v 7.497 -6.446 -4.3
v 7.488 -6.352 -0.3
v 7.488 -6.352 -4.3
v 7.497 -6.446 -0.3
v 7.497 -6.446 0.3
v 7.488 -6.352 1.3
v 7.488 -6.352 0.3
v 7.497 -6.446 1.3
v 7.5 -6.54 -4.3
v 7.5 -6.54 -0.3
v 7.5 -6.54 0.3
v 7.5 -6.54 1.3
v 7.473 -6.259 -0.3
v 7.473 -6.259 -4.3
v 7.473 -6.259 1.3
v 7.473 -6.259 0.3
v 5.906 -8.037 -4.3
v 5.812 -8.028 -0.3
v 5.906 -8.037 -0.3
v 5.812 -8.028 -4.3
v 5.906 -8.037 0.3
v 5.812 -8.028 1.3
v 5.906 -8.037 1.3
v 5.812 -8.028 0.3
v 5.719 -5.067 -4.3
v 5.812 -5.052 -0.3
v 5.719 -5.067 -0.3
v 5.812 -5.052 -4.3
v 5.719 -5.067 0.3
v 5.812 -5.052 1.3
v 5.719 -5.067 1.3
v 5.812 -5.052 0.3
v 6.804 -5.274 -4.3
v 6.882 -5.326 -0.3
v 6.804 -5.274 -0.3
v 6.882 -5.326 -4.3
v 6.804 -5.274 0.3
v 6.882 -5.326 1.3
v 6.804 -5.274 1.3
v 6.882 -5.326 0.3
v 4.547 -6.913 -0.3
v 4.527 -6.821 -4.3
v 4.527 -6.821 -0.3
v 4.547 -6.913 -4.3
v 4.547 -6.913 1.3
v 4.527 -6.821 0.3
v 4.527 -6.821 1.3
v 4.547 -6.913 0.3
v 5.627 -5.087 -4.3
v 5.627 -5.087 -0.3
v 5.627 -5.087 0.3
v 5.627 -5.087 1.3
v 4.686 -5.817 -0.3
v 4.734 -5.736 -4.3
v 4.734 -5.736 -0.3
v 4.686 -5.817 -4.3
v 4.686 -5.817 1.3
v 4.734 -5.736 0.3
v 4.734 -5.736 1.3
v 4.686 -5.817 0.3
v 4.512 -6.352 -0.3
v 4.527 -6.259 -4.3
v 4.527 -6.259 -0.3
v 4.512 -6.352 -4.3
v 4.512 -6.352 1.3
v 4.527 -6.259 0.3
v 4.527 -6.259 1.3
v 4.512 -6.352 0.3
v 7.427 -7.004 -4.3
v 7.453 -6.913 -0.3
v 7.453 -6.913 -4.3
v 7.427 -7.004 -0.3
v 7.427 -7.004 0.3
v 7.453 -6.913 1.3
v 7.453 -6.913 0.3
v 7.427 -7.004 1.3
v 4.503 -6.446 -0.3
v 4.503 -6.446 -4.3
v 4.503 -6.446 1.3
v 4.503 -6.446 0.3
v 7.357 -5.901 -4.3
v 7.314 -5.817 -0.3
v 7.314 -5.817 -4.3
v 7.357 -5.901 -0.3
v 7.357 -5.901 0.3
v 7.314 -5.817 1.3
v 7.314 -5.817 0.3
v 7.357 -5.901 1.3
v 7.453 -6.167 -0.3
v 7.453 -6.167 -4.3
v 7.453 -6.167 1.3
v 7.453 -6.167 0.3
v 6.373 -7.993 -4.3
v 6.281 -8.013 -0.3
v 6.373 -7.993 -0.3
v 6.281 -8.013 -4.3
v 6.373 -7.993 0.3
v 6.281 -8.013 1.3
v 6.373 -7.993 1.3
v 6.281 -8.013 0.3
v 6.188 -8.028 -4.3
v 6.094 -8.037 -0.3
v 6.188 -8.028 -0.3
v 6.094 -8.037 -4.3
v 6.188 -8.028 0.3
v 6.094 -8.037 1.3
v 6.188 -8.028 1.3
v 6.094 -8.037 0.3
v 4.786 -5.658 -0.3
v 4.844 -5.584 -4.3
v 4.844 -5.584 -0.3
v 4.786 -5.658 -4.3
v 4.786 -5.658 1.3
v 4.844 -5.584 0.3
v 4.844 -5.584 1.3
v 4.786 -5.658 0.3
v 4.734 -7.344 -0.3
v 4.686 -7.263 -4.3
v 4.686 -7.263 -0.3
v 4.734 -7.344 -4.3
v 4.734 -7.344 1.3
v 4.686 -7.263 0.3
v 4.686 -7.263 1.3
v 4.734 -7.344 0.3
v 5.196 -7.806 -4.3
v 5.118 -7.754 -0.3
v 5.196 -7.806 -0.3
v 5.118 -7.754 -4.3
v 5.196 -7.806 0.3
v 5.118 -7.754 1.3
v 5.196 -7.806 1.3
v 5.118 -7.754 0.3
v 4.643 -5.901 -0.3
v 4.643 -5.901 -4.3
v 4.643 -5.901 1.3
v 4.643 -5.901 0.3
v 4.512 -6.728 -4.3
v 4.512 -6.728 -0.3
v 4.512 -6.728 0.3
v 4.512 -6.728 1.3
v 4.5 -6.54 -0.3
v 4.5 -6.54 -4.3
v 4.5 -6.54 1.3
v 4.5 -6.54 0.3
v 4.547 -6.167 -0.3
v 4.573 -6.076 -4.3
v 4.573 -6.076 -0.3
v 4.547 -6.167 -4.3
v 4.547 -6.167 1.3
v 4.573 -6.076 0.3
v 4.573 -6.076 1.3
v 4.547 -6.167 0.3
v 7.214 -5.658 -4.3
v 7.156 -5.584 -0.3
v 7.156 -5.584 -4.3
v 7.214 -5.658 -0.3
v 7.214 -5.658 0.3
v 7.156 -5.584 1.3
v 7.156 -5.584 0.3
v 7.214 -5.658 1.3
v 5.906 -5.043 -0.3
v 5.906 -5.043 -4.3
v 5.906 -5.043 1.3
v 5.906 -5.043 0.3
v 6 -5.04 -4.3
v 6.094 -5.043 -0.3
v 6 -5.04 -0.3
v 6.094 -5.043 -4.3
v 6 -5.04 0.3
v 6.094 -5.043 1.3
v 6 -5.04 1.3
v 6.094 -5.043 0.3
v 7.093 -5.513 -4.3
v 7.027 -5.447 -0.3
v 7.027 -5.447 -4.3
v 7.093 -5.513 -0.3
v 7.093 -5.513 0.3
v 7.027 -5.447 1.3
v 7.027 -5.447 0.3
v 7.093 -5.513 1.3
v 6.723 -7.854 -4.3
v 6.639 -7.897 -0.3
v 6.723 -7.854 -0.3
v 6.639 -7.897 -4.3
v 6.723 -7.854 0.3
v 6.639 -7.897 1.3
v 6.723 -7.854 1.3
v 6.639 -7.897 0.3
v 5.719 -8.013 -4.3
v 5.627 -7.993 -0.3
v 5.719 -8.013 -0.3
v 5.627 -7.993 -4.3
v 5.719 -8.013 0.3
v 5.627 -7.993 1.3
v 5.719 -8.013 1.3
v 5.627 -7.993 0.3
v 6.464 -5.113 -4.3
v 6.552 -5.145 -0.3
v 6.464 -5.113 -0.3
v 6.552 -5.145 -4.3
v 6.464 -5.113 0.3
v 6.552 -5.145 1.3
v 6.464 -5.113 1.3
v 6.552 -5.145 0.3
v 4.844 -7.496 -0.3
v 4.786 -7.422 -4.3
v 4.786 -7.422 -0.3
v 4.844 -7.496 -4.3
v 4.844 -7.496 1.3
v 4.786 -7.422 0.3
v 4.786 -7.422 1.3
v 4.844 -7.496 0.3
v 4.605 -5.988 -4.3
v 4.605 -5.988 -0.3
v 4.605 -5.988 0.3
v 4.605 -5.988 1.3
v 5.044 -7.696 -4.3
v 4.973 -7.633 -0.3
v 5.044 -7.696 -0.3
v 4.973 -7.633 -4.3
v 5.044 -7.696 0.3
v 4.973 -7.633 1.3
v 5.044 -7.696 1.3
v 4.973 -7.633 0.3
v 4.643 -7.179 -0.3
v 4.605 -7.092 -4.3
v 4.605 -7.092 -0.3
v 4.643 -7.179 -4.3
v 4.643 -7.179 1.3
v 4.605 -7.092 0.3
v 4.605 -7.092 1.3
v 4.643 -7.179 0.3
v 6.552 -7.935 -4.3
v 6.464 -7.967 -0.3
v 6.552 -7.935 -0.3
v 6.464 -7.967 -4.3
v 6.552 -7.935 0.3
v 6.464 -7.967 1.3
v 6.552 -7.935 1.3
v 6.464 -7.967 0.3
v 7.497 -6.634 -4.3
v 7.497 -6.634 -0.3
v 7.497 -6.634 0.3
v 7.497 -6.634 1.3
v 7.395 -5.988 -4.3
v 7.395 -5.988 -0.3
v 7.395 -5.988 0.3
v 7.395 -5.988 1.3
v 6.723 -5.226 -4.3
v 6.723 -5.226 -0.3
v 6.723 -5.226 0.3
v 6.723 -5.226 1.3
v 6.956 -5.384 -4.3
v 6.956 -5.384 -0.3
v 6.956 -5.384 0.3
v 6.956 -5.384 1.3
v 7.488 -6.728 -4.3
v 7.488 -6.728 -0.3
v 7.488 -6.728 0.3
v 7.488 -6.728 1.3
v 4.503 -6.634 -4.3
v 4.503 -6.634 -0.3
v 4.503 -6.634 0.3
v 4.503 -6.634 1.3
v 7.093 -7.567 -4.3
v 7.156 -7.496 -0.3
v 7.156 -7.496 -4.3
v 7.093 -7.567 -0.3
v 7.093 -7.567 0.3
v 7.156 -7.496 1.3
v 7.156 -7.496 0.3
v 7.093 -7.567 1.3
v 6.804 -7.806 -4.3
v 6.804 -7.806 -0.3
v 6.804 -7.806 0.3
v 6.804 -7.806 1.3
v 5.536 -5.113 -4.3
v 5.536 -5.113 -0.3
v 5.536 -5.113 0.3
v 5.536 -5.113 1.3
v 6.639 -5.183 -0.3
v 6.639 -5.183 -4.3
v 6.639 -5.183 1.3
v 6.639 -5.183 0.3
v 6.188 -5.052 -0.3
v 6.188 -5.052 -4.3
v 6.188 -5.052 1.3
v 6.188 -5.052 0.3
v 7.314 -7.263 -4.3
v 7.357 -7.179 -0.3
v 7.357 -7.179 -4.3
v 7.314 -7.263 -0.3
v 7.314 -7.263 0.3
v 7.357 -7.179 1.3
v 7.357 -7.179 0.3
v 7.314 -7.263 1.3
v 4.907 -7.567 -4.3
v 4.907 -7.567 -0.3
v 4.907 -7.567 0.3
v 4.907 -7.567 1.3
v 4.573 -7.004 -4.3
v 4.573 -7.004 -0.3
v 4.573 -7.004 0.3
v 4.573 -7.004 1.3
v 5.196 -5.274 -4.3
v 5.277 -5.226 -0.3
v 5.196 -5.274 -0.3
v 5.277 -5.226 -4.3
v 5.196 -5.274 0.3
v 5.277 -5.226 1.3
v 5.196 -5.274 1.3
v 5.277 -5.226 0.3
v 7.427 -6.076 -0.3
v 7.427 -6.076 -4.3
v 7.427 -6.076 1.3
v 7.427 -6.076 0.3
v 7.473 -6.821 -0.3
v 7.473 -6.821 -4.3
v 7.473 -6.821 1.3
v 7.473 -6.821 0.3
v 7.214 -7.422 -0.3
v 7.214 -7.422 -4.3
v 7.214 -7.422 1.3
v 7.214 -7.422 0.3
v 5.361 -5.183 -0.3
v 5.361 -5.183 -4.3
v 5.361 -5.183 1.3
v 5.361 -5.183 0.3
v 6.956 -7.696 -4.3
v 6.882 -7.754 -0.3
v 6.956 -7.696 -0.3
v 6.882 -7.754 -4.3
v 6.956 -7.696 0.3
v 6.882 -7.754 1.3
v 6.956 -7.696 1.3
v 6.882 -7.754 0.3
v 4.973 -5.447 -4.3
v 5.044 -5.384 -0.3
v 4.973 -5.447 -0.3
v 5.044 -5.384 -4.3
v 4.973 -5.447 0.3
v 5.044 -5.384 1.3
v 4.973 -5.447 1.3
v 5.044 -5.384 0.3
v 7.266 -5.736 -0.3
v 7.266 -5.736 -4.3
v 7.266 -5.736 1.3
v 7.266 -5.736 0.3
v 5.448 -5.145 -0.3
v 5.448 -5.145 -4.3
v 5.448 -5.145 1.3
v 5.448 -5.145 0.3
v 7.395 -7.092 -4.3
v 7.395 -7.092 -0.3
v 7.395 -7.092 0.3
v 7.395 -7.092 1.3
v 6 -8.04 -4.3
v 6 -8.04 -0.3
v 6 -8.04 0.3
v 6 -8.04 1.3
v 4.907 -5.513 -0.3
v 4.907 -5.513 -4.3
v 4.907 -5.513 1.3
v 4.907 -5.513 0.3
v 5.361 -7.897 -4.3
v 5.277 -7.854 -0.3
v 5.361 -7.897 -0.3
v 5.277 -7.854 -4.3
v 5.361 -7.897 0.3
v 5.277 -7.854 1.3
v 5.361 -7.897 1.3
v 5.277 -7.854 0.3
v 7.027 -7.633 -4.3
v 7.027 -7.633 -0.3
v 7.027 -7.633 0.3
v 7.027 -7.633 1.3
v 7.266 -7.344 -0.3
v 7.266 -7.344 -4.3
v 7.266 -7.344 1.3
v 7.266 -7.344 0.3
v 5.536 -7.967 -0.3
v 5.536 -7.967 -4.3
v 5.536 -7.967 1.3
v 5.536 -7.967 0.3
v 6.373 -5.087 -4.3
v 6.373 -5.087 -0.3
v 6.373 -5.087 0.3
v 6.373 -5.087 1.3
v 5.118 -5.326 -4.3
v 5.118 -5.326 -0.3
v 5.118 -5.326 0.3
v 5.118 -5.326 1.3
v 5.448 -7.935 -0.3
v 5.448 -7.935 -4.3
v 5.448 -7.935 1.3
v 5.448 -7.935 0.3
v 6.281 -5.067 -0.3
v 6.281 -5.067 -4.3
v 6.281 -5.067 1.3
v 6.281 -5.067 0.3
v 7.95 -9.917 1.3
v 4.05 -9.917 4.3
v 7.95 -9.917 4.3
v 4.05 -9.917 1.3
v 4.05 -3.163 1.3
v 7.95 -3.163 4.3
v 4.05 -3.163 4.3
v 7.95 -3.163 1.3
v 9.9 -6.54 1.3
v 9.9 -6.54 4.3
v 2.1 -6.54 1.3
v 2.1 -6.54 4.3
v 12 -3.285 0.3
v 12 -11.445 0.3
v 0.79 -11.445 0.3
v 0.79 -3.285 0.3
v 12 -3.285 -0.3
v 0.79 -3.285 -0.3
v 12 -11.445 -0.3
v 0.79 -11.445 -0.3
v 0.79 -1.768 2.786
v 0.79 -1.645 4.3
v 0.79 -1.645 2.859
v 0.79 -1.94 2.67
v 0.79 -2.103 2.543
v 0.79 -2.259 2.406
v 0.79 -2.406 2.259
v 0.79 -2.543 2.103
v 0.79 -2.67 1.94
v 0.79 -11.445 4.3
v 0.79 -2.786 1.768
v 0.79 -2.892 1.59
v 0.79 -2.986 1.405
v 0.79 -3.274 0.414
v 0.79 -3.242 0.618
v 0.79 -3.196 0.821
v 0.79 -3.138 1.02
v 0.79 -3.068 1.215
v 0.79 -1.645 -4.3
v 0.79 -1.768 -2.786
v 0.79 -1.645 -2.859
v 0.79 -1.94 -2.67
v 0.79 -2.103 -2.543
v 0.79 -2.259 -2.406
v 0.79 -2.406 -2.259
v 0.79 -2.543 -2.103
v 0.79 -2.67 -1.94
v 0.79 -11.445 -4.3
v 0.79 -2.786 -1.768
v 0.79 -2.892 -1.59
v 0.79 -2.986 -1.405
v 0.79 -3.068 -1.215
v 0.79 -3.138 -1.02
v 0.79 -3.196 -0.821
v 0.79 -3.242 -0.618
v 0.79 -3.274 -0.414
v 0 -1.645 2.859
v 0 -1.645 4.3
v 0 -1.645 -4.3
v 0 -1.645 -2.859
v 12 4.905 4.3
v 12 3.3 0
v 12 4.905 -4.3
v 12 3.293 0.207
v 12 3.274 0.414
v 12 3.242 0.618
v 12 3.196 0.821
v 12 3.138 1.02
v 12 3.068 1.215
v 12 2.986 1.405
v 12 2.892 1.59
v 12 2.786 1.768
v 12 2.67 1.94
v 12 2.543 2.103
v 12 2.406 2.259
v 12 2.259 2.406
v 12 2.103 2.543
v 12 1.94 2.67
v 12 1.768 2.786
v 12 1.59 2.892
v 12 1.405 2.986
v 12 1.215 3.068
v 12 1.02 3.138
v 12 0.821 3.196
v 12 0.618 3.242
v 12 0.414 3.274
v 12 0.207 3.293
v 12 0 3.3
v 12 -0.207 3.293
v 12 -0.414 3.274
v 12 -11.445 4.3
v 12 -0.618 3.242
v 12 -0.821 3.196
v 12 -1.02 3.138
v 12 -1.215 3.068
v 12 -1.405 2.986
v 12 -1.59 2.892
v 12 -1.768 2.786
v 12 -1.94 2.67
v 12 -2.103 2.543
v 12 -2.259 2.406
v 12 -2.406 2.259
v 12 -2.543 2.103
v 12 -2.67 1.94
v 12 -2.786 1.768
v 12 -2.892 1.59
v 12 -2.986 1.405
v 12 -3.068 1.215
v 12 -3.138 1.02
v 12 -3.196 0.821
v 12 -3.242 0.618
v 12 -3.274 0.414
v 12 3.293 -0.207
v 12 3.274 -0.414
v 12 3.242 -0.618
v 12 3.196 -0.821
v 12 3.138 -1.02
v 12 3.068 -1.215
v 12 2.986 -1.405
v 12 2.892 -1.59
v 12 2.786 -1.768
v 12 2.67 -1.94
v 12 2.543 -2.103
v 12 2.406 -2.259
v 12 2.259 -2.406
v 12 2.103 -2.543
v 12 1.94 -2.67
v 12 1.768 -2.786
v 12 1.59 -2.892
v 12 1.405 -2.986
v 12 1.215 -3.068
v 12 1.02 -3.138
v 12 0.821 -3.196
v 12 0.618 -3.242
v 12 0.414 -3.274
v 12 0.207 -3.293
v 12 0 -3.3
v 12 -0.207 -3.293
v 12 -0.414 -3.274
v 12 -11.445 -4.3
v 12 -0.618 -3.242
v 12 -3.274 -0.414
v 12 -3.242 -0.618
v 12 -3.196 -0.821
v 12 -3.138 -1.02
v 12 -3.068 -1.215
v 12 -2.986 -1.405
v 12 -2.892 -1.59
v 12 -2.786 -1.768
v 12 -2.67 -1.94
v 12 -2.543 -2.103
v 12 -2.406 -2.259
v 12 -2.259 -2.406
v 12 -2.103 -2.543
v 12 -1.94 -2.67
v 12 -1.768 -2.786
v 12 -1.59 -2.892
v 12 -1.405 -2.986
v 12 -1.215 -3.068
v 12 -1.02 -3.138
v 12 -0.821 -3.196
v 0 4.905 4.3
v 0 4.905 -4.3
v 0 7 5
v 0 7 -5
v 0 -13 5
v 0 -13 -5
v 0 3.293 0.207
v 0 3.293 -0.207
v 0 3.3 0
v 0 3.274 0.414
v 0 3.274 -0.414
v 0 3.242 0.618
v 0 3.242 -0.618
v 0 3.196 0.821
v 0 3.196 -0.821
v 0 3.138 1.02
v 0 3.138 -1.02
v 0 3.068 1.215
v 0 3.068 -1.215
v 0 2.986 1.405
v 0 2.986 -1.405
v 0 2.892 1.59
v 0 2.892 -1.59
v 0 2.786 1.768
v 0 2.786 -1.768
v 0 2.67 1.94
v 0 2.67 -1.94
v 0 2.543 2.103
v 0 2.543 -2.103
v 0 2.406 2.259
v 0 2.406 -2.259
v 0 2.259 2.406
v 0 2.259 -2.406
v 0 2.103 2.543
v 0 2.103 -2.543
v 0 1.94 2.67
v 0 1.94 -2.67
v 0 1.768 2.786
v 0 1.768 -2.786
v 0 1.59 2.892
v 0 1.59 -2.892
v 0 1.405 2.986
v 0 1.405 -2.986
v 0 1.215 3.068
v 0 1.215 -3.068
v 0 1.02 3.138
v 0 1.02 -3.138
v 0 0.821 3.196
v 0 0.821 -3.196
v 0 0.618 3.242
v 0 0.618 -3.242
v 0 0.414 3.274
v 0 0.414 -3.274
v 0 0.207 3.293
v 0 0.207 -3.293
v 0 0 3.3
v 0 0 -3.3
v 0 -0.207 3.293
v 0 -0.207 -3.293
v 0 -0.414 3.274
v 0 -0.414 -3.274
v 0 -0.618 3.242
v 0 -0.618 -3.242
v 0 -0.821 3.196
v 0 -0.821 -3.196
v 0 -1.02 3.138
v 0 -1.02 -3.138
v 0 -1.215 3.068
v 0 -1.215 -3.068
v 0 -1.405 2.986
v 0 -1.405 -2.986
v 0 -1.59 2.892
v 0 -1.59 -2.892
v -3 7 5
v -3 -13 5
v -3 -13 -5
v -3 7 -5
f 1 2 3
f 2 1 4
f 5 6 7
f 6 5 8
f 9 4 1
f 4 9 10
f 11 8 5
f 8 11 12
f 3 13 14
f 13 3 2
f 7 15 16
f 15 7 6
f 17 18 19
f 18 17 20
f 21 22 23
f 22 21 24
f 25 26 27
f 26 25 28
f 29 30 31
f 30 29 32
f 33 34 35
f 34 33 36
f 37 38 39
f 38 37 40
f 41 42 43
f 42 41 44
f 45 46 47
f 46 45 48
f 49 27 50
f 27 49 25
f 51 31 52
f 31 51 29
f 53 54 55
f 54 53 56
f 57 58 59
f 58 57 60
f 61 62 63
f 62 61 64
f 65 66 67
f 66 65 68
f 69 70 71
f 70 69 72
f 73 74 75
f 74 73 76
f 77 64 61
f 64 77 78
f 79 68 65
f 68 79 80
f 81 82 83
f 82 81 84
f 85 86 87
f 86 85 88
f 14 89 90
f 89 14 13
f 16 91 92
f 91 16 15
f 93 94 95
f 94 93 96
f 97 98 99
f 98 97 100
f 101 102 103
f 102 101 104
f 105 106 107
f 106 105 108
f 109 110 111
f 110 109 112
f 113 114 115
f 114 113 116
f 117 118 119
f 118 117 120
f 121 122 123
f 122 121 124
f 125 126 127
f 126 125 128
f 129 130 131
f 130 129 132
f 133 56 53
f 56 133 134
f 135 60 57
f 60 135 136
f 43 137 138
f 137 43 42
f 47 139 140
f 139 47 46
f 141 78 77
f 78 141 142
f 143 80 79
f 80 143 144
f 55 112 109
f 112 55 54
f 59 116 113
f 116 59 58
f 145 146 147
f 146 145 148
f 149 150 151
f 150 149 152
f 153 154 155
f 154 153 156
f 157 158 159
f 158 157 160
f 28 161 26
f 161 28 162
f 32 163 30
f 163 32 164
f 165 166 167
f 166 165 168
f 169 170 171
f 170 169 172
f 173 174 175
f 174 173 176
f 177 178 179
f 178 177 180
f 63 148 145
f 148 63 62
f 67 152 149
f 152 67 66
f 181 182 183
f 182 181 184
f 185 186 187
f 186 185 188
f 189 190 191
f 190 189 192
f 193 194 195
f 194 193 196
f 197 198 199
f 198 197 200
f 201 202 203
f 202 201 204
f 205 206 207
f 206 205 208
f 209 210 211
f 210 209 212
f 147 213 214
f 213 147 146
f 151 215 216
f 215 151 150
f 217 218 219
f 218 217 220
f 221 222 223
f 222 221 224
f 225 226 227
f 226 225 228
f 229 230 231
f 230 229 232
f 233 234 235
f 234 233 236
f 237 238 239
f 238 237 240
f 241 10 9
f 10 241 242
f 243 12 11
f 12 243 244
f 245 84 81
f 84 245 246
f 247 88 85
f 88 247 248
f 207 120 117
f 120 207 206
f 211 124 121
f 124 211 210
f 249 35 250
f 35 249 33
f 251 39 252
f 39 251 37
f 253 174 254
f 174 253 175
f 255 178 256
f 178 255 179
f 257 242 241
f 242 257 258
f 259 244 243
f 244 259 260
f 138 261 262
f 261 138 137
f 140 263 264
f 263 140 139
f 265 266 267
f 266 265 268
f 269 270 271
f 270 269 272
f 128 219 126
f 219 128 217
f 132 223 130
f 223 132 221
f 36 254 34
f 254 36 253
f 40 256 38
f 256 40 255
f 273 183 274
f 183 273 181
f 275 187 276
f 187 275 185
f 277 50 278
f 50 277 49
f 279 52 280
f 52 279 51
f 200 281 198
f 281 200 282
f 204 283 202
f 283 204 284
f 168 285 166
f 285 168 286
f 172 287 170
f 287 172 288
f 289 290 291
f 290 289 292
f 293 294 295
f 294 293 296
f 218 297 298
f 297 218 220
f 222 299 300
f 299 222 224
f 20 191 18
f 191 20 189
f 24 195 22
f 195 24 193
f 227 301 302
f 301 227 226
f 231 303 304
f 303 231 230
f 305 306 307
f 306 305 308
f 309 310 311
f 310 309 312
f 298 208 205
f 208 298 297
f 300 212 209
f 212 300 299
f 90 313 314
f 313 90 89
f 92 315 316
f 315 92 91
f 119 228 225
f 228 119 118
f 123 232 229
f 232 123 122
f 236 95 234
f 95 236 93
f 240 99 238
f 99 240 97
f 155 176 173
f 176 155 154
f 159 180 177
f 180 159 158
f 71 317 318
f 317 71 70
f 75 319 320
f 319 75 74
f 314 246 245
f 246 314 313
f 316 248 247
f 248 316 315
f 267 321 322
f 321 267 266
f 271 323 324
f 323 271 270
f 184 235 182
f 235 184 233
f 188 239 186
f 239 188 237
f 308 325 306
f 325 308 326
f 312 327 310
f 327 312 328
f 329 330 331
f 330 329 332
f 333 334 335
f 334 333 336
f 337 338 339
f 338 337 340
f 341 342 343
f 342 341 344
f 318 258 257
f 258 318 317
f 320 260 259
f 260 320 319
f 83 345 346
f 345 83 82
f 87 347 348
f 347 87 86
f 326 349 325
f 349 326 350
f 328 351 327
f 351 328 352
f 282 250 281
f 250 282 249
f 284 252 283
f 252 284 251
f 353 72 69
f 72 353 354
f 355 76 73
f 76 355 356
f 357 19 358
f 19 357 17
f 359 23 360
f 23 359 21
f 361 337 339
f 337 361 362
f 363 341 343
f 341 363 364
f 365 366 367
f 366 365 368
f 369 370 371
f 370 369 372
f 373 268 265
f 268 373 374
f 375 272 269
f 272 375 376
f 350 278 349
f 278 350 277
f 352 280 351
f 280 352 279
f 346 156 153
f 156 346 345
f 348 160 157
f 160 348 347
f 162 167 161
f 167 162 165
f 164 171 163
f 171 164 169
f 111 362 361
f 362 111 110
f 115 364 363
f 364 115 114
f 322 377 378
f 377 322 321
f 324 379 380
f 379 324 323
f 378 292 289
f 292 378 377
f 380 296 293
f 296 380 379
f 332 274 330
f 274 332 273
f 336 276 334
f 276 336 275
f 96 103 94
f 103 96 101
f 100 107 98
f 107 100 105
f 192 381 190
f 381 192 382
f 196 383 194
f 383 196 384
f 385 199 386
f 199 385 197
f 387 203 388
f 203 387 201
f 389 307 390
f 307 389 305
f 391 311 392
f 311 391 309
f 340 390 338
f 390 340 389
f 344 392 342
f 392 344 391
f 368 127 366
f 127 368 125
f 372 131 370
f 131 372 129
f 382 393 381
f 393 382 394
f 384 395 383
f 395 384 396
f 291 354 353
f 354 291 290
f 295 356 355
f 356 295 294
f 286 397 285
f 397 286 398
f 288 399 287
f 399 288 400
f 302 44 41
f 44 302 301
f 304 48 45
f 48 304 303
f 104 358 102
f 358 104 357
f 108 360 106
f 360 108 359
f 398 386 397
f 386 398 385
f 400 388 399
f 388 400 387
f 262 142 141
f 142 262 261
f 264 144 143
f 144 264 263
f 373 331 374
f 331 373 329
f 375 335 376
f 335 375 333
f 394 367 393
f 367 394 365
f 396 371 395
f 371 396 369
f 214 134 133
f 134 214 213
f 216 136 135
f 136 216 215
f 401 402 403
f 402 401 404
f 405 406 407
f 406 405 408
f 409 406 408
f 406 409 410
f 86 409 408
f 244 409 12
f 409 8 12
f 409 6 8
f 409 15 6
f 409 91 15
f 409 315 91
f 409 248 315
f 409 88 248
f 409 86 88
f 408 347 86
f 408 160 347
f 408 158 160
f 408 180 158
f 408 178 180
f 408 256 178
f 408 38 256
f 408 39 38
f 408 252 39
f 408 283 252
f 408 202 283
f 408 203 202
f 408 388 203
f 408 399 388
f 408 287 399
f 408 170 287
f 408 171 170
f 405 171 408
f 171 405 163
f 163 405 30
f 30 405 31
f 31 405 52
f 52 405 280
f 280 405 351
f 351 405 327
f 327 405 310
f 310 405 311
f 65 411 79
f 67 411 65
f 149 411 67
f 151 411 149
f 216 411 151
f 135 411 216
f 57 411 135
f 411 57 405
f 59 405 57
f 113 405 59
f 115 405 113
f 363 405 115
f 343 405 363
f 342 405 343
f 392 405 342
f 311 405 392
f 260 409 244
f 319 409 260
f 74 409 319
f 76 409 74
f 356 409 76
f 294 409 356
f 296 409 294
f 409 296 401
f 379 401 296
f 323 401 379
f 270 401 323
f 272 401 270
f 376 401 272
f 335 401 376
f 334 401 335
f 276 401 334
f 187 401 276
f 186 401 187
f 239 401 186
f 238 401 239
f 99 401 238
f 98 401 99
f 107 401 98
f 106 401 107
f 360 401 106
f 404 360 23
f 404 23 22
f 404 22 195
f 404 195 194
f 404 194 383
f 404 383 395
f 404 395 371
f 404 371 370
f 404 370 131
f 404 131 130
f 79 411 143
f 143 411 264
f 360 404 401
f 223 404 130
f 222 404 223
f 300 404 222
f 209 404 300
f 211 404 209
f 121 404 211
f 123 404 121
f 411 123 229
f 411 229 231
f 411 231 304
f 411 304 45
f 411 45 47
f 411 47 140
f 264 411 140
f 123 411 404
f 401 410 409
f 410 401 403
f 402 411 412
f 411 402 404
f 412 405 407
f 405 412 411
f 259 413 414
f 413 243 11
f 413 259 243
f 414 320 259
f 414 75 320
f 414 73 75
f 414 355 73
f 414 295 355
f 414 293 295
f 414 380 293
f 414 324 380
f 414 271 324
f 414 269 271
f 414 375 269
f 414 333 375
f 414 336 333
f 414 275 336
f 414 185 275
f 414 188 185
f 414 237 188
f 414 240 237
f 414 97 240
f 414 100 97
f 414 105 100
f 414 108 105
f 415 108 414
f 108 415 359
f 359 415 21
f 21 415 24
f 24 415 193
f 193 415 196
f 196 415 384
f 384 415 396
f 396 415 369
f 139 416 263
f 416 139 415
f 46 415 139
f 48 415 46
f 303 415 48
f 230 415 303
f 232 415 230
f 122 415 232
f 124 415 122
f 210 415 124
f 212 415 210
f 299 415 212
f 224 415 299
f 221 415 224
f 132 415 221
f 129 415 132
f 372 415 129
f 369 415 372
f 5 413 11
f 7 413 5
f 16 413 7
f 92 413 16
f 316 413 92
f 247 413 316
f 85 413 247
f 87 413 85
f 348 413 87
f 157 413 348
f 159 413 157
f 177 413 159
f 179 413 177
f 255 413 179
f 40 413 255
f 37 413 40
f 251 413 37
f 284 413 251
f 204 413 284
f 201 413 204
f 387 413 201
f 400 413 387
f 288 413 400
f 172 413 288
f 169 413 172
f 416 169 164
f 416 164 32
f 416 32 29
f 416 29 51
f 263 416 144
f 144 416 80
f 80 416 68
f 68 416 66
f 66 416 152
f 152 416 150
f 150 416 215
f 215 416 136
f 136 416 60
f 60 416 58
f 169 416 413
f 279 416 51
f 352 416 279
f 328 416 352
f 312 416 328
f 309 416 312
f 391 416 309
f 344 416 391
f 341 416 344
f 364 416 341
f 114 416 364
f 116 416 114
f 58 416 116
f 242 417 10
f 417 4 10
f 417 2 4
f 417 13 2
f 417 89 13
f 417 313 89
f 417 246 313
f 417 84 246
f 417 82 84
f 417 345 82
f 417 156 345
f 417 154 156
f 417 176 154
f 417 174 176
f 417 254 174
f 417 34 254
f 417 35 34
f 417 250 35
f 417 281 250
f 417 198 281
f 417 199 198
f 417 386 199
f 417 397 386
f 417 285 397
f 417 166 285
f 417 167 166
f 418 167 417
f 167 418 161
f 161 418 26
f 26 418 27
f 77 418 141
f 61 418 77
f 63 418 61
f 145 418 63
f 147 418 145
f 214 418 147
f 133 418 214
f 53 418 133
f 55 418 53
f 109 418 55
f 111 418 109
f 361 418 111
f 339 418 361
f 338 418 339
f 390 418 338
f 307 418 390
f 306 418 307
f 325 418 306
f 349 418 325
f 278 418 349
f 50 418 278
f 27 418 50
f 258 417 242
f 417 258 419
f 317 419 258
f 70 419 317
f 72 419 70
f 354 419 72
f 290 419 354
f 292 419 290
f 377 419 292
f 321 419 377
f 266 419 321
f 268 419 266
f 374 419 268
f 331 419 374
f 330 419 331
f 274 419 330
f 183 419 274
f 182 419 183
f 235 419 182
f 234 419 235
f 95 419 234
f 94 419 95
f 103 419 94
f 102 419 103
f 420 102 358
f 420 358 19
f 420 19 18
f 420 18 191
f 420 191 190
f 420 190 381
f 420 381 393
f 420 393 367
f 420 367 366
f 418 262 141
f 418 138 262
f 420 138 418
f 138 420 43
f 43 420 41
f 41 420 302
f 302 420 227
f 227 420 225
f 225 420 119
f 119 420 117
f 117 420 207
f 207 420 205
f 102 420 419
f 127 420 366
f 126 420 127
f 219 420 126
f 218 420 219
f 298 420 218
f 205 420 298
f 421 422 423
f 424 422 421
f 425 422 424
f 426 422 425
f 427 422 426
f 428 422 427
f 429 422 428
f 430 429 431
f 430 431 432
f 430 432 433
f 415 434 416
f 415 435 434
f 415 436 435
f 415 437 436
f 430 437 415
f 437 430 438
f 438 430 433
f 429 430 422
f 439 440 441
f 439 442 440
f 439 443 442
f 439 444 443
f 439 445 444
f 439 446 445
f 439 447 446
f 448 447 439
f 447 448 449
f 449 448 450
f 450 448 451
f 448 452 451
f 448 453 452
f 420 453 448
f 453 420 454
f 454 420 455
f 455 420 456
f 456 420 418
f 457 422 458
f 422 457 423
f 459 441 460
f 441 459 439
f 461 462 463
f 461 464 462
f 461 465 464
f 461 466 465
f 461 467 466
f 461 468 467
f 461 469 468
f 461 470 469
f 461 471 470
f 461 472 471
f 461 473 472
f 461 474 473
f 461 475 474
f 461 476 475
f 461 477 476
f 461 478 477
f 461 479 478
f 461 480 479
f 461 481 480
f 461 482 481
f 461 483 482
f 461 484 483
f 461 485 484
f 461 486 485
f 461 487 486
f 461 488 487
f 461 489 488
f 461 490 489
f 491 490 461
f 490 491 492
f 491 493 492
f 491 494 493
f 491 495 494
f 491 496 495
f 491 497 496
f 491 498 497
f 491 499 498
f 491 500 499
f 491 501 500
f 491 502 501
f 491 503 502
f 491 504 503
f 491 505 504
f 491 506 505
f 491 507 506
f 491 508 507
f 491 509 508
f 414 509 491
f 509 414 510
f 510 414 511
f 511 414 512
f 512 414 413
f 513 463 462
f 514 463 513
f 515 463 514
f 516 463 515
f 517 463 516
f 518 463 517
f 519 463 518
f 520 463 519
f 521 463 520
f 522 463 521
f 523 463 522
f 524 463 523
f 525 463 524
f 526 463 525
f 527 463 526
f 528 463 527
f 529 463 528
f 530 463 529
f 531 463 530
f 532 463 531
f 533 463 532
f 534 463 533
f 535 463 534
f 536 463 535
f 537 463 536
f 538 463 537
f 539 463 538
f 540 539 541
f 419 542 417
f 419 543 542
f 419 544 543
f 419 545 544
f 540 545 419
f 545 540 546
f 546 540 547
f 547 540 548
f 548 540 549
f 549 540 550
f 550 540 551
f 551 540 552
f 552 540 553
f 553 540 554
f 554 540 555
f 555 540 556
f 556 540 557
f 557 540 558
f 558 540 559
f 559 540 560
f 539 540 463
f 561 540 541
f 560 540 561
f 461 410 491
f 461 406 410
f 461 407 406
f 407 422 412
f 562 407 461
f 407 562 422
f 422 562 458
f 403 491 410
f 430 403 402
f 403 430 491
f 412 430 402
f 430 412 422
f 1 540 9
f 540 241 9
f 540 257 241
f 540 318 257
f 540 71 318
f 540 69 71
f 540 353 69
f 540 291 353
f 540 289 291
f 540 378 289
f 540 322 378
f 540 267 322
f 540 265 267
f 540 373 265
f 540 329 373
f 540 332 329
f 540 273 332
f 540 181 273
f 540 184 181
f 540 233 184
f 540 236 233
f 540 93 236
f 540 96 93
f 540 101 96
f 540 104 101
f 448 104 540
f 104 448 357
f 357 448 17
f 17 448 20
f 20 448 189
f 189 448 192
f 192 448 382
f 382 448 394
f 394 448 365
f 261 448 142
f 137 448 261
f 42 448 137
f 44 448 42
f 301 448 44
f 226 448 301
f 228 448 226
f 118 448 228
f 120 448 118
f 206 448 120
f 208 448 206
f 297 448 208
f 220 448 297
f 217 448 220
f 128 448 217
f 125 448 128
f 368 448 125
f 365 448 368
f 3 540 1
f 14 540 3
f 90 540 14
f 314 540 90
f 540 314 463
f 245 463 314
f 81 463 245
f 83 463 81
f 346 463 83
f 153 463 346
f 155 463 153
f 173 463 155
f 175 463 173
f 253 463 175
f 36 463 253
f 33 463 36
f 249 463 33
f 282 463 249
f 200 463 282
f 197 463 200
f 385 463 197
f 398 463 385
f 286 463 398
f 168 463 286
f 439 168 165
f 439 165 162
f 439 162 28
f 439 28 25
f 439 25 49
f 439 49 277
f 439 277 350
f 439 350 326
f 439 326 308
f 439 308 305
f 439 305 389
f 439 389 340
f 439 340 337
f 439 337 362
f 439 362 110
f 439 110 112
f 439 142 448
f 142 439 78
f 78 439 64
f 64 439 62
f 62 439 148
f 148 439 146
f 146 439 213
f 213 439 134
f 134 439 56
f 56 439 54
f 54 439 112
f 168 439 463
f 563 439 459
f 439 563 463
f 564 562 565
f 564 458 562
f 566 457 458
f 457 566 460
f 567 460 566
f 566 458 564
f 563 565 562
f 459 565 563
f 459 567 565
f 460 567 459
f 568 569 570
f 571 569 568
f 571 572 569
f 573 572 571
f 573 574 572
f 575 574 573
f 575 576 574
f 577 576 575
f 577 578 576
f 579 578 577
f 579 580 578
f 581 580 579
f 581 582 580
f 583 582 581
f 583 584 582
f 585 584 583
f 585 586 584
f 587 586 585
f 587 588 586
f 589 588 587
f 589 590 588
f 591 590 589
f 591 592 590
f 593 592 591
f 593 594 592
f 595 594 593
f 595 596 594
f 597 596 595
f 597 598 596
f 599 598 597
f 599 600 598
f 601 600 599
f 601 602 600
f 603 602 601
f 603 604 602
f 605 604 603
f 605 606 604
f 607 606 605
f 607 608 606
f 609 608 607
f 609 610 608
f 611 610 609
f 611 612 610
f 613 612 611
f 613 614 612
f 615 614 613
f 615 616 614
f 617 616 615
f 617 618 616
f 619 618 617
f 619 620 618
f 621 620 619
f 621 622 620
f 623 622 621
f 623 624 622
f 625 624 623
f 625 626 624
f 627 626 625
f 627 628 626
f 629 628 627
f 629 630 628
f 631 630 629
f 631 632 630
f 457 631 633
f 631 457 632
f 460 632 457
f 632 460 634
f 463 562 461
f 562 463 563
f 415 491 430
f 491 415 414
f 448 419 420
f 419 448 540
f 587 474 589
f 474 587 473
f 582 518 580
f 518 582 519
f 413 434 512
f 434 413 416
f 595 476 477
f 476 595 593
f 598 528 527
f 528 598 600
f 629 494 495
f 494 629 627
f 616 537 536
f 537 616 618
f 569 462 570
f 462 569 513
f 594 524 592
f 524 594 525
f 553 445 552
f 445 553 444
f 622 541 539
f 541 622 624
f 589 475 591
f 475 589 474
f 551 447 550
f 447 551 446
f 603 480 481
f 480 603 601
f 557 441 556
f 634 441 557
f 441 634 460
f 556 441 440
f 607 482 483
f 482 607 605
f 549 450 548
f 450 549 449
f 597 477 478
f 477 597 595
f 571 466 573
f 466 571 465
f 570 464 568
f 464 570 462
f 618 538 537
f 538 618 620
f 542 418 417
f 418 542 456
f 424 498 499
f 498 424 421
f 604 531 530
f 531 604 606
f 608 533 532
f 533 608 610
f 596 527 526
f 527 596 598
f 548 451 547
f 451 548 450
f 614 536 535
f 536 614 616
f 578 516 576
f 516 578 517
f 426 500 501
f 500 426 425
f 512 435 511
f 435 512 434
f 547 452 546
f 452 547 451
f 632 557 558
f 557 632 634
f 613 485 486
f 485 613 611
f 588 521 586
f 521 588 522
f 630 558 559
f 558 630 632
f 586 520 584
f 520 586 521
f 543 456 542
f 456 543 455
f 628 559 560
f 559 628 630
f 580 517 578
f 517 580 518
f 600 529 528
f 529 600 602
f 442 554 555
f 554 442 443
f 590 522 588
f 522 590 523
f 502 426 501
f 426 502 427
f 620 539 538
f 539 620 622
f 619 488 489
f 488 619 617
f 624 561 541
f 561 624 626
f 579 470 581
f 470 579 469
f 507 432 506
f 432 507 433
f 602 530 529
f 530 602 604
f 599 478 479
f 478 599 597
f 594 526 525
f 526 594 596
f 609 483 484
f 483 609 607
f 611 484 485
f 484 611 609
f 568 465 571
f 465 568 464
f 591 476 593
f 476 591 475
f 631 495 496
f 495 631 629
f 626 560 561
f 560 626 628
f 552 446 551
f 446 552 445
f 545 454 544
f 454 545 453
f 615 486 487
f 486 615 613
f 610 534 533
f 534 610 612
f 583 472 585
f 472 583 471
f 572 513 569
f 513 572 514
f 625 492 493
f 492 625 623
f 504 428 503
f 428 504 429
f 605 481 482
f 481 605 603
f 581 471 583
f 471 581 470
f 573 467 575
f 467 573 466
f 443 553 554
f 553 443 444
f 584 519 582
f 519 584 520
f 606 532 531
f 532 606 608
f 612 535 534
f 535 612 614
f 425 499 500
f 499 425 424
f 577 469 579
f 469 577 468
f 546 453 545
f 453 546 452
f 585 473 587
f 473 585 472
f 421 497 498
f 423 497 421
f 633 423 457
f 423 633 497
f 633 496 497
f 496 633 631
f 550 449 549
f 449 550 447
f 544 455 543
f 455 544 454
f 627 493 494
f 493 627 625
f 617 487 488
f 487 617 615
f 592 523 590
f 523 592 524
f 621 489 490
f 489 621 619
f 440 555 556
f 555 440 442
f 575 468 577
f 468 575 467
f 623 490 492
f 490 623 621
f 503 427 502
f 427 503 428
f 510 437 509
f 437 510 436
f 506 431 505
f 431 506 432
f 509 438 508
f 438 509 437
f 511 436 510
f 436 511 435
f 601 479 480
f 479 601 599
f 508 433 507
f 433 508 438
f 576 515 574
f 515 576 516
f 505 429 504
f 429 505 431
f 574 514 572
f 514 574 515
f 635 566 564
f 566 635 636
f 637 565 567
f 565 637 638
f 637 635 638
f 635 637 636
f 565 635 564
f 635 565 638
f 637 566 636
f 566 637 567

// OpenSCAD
// file: at_global.scad
// Auto Titrator Global 

//Parameters and functions declared here.

//Global parameters
rod_d = 6.6; // Diameter to use for structural rod holes
trod_d = 6.5; // Diameter to use for threaded rod holes
bolt_d = 3; // Diameter to use for bolts
nut_r = 3.9; // Radius to use for nut traps not DIAMETER
nut_t = 3; // Thickness of small nut
nut_d = 2*nut_r;
trod_nut_d = 12.5;
trod_nut_d_snug = 12.4; // A tight fit for the nut trap
trod_nut_t = 5.8; // Thickness of threaded rod nut
tol = .01; // Used to make preview prettier, should set to 0 for production.

build_mode = false;  // Set to false if trying to view the entire project.

// Need threaded rod bolt size.  Using approximate at the moment.

//trod_bolt_d = 7.8;  Not sure if this is needed

rod_clamp_x = 12; // Rod clamp dimensions
rod_clamp_y = rod_d+2.5*nut_r; // Diameter of the clamp for securing rods
rod_clamp_z = rod_d+2;
// Consider rod_clamp_slot = 2; // height of slot

// Support rod positions are placed relative to the threaded rod.
rod_disp_z = 9;
rod_disp_y = 10;
/*
 When refactoring, create 'local' variables such as carriage_rod_z and carriage_rod_y, the latter can be an array for looping instead of doing the +/- 1 trick I'm using right now.
 
 Motor assembly has not been updated since I feel this refactoring should be done before I make the code more complex.
 */
 


// ** Old notes **
// Set screw hole diameter to 3
// Set 1/4" threaded rod hole diamter to 6.5
// Set 1/4" steel rod hole diameter to 6.6
// Set nut trap to circle(3.9,$fn=6).  3.8 might work for a tight fit.
//polygon([[0., 1.], [-0.866025, 0.5], [-0.866025, -0.5], [0., -1.], [0.866025, -0.5], [0.866025, 0.5]]);

/* *** VARIABLE DEFINITIONS ***
rod is for support rods
trod is for the threaded rod
the three parts are idler, carriage and motor_assembly

*/

module rod_clamp(pos = 0.3,slot=.6,rot=false){
// Rod hole will not be included initially, as doing so
// may result in alignment problems later on.
// rod_clamp will be considered a build up module    
    translate([rot==true?rod_clamp_x:0,0,0])
    rotate(rot==true?180:0,[0,0,1])
    translate([0,-0.70*rod_clamp_y,-0.5*rod_clamp_z])
    difference(){
        cube([rod_clamp_x,rod_clamp_y,rod_clamp_z]);
        union(){
            // bolt
            translate([rod_clamp_x/2, 
                pos*rod_clamp_y,-tol])
            cylinder(d=bolt_d,h=rod_clamp_z,$fn=100);
            // nut
            translate([rod_clamp_x/2, pos*rod_clamp_y,
                rod_clamp_z-nut_t])
            cylinder(d=nut_d,h=nut_t+tol,$fn=6);
            // slot
            translate([-tol,-tol,(rod_clamp_z-slot)/2])
            cube([rod_clamp_x+2*tol,0.75*rod_clamp_y,
                slot]);
            // strain release
            // 0.6*rod_clamp_y is arbitrary, 
            //   and a mix between
            //   relieving strain and having the clamp
            //   come loose from the base.
            //   Cutout thickness (0.8) seems to work OK.
            translate([rot==true?rod_clamp_x-0.8+tol:-tol,
                -tol,-tol])
            cube([0.8,0.6*rod_clamp_y,rod_clamp_z+2*tol]);
        }
    }
}

// My first attempt at a linear bearing.  This module
//    creates a perimeter of circles to minimize the 
//    surface area between plastic and rod and possibly
//    allows for holding in grease.  Radius is the 
//    size of the rod and ridge is the radius of the
//    ridge circles.  Ignore tol for the moment.
//  
// This is a build up module but will also need the rod
//    hole cut out.
module bearing(radius=rod_d/2,ridge=1.0,tol=0, debug=false){
    ro = radius+tol;
    ri = ridge;
    r = ro+ri;
    max = floor(360/acos(1-pow(ri,2)/pow(ro,2)));
    if (debug) {
        echo (max);
        echo (str("cut out ", r+ri));
    };
    
    difference(){
    circle(r+ri,$fn=100);
    circle(r,$fn=100);
    }
    for(i=[1:max]){
    translate([r*sin(i/max*360),r*cos(i/max*360),0])circle(r=ri,$fn=100);
    }
    
}
// Helper function to return the size of the cutout.  Not
//   a great solution, IMO.  Pass the same paramters as
//   you will to bearing.
function bearing_cutout(radius=rod_d/2,ridge=1.0) = 
    radius + 2*ridge;

    
// main file
include <at_global.scad>;

*difference(){
    
    difference(){
        rod_clamp(pos=0.30,slot=0.6);
        translate([0,-13,-0.55*rod_clamp_z])
        cube([0.8,
            0.7*rod_clamp_y,1.1*rod_clamp_z]);
    }
    rotate(90,[0,1,0])
    cylinder(d=rod_d,h=30,$fn=100);
}
difference(){
    rod_clamp();
    rotate(90,[0,1,0])
    cylinder(d=rod_d,h=30,$fn=100);
}
translate([-3,-13,-5])cube([3,20,10]);
   
